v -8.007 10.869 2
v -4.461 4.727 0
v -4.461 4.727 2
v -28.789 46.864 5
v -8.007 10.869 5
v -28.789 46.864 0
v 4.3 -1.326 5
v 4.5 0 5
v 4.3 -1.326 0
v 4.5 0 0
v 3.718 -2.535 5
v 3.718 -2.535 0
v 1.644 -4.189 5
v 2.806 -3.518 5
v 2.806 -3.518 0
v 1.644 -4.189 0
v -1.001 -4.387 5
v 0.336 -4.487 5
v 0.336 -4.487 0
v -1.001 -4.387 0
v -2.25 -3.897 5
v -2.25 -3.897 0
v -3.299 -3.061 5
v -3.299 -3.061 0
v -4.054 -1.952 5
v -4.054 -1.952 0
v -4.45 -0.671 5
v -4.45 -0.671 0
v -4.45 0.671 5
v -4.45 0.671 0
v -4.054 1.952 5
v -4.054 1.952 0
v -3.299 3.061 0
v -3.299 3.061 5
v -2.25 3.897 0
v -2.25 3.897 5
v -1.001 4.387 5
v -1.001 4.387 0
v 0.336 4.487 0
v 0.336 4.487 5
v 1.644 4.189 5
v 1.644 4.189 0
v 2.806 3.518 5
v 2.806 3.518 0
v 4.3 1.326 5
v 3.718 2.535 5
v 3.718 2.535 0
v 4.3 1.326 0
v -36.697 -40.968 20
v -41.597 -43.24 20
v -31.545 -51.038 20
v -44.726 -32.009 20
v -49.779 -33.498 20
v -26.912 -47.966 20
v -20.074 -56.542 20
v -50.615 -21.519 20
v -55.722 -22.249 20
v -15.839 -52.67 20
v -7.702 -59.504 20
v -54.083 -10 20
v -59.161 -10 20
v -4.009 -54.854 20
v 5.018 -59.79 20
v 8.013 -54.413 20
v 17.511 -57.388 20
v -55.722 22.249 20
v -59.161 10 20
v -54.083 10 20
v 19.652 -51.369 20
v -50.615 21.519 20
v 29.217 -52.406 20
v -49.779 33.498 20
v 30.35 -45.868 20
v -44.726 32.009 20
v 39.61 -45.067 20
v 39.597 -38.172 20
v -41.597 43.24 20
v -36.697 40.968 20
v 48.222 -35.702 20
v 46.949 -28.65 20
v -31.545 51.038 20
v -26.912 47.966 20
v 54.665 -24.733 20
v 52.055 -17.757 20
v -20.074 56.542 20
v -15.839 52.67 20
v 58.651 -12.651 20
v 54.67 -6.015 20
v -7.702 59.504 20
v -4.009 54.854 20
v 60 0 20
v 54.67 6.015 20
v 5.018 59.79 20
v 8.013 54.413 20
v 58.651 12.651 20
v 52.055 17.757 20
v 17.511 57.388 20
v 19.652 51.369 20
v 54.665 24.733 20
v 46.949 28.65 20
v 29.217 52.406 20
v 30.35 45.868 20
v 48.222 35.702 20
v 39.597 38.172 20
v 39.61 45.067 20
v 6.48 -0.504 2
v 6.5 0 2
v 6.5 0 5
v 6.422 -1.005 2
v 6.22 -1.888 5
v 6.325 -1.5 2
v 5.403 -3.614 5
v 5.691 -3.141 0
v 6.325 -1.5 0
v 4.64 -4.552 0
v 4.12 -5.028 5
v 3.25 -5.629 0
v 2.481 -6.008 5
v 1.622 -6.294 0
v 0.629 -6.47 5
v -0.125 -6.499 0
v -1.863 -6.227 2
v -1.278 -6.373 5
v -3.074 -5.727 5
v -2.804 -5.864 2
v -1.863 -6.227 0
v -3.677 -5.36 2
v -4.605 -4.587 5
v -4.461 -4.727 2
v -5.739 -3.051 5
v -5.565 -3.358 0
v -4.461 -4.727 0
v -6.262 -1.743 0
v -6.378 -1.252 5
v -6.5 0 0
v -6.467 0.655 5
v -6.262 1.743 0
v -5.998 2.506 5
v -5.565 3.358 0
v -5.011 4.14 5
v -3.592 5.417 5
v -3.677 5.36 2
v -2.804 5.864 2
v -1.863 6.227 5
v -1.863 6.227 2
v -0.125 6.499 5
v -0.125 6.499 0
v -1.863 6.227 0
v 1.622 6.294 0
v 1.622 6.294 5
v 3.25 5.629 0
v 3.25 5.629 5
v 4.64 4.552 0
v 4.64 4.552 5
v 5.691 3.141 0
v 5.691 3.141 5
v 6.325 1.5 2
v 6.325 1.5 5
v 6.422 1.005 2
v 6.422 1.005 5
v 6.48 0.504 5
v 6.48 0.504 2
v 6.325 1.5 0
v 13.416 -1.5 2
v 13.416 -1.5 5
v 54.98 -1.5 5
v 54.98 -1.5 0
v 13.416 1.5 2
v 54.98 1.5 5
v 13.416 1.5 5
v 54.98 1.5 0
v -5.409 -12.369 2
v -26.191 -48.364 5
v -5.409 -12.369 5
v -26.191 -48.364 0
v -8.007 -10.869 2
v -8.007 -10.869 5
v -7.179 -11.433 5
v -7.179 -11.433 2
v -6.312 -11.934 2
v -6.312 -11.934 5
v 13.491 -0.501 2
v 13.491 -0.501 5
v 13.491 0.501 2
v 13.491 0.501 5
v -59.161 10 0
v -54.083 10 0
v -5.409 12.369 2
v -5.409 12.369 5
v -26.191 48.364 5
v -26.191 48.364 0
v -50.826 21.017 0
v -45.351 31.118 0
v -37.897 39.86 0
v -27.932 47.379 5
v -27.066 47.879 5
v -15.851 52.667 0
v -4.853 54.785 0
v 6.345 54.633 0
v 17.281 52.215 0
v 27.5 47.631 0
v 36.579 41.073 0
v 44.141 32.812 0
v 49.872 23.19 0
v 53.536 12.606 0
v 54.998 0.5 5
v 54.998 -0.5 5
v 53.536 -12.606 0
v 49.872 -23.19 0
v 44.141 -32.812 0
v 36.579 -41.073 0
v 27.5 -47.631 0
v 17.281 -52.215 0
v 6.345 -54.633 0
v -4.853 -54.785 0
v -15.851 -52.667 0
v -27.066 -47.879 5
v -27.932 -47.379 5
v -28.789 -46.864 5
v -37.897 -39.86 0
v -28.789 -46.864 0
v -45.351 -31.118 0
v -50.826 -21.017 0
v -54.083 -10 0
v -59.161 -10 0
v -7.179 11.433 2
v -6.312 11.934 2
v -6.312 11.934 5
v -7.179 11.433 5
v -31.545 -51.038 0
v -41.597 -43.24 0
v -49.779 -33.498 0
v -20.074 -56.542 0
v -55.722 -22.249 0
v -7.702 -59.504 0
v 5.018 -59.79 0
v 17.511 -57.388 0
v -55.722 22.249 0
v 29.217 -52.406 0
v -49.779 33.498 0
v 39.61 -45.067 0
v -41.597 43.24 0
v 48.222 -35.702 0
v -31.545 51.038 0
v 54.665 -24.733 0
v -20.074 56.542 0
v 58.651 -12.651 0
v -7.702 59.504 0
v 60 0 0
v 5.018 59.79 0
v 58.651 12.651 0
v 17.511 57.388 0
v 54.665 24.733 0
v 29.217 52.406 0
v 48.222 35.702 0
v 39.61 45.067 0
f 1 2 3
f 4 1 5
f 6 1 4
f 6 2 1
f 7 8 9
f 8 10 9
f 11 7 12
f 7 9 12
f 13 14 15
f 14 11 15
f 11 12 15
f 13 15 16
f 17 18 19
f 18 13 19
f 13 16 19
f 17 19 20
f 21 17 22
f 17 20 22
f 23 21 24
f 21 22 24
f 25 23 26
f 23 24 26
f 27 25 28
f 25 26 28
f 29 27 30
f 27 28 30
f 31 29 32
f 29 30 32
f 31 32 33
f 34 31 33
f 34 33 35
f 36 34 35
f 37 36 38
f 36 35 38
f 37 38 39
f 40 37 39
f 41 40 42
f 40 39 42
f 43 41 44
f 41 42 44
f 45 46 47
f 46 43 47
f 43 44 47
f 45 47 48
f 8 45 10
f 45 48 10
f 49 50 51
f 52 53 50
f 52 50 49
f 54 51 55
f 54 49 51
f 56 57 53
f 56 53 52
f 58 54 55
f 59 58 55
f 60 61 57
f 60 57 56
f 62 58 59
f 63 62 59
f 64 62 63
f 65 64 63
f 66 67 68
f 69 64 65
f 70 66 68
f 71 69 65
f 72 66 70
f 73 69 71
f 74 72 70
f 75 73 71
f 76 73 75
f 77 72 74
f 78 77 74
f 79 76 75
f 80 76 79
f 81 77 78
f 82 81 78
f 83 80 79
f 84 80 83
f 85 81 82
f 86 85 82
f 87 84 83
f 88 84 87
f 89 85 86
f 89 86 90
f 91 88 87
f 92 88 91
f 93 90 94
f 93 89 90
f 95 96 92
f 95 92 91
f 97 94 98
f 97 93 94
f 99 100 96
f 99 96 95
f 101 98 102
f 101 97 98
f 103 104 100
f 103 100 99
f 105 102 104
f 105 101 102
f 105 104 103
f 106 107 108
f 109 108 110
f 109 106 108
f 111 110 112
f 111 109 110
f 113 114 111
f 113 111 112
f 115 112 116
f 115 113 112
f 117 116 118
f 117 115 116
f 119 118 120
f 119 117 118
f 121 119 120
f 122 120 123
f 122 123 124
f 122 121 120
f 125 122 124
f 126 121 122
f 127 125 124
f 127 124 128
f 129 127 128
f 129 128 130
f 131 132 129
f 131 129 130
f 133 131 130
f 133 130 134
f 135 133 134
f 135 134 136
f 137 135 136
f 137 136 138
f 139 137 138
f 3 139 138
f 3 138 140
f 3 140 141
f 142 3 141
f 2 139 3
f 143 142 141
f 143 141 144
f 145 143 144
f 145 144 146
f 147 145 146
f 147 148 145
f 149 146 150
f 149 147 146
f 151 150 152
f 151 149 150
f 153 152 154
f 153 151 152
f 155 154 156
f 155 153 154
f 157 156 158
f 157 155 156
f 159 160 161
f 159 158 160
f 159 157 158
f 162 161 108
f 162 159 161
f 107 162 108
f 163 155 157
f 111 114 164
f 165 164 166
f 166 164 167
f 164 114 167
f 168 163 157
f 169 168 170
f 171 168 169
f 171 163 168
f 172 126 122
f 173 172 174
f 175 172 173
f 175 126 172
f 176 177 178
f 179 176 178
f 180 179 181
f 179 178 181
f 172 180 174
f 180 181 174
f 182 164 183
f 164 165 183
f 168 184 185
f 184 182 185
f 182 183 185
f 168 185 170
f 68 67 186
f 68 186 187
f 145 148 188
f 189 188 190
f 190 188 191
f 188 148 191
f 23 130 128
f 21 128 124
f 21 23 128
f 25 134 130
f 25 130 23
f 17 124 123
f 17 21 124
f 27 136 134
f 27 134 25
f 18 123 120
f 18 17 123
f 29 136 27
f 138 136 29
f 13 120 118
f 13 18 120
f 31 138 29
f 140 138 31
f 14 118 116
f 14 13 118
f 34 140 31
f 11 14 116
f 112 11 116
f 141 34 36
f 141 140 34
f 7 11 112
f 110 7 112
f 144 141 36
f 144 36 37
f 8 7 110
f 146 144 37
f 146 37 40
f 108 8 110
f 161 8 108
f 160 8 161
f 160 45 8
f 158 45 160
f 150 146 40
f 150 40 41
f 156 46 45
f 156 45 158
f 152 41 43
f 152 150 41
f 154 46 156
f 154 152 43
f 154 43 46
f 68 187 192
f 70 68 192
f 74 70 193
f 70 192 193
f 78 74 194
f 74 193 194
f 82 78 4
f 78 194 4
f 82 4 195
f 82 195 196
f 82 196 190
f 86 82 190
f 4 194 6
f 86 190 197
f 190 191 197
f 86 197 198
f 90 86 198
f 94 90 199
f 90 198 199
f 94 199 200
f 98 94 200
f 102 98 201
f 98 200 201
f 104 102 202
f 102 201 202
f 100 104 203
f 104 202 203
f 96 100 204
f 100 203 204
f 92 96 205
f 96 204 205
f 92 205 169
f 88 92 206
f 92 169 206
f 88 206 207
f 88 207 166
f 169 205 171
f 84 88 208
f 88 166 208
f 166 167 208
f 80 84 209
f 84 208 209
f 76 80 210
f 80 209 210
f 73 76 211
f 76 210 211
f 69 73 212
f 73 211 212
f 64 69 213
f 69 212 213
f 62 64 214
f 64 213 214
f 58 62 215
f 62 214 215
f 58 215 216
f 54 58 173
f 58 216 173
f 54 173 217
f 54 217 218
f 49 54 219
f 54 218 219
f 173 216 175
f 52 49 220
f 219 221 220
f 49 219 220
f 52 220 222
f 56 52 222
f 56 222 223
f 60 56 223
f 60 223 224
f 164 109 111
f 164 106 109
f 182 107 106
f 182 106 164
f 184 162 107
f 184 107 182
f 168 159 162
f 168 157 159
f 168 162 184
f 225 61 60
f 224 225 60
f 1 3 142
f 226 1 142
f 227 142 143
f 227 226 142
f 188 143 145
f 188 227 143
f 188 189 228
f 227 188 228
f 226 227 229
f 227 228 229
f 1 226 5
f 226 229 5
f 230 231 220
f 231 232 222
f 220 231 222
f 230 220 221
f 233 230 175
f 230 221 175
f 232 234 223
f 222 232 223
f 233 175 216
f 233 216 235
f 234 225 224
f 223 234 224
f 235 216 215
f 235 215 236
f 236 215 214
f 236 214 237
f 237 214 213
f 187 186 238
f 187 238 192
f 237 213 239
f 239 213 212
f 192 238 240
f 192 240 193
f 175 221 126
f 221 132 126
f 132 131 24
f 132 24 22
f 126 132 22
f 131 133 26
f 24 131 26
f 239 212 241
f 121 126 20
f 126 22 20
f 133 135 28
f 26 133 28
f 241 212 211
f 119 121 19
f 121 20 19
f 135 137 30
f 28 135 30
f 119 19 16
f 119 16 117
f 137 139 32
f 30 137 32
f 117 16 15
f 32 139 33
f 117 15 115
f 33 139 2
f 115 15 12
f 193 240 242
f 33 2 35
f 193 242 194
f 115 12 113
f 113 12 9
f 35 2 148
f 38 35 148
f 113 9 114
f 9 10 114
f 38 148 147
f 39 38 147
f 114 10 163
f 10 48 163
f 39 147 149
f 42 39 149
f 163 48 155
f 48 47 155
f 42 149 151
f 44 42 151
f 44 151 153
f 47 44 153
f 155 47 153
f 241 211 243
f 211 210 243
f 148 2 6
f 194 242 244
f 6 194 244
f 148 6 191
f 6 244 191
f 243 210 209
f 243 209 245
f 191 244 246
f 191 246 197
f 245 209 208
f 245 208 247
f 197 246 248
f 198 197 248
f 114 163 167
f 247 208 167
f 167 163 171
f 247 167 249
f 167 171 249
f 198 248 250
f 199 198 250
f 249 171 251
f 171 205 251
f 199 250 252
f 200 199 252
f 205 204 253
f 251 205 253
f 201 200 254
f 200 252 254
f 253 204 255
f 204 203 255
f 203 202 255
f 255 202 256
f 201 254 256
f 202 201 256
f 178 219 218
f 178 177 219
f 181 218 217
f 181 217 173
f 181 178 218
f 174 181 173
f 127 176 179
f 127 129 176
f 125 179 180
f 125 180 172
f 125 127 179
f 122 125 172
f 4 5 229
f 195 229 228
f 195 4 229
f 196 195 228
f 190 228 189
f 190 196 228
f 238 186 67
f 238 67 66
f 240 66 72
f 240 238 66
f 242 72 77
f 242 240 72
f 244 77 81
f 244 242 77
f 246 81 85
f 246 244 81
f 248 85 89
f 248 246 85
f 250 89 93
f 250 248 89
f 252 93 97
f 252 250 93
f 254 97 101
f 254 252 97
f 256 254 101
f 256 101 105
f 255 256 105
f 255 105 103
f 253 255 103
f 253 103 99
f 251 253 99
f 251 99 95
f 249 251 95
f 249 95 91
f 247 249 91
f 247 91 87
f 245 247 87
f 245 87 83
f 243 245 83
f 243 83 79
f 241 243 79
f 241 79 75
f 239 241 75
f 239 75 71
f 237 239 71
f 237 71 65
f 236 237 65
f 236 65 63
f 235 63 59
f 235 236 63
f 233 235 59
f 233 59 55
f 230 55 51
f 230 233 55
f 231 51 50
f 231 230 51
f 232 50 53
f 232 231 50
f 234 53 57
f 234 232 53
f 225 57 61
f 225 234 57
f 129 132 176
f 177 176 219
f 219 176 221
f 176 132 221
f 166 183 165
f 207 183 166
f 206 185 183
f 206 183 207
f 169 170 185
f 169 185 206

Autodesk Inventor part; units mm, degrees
ref_plane "YZ Plane" through (0, 0, 0) normal (1, 0, 0) x (0, 1, 0)
ref_plane "XZ Plane" through (0, 0, 0) normal (0, 1, 0) x (-1, 0, 0)
ref_plane "XY Plane" through (0, 0, 0) normal (0, 0, 1) x (1, 0, 0)
sketch "Sketch1" plane through (0, 0, 0) normal (0, 0, 1) x (1, 0, 0)
  circle A0 centre (0, 0) radius 60 construction
  line L0 (-59.1608, 10) -> (-59.1608, -10) construction
  circle A1 centre (0, 0) radius 55 construction
  line L1 (-59.1608, 10) -> (-54.0833, 10)
  line L2 (-59.1608, -10) -> (-54.0833, -10)
  arc A2 (-59.1608, -10) -> (-59.1608, 10) centre (0, 0) ccw
  arc A3 (-54.0833, -10) -> (-54.0833, 10) centre (0, 0) ccw
  circle A4 centre (0, 0) radius 4.5
  circle A5 centre (0, 0) radius 6.5
  line L3 (4.2426, 1.5) -> (59.9812, 1.5)
  line L4 (4.2426, -1.5) -> (59.9812, -1.5)
  arc A6 (4.2426, -1.5) -> (4.2426, 1.5) centre (0, 0) ccw
  arc A7 (59.9812, -1.5) -> (59.9812, 1.5) centre (0, 0) ccw
  line L5 (-3.4204, 2.9242) -> (-31.2897, 51.1953)
  line L6 (-0.8223, 4.4242) -> (-28.6916, 52.6953)
  line L7 (-0.8223, -4.4242) -> (-28.6916, -52.6953)
  line L8 (-3.4204, -2.9242) -> (-31.2897, -51.1953)
  arc A8 (-0.8223, 4.4242) -> (-3.4204, 2.9242) centre (0, 0) ccw
  arc A9 (-3.4204, -2.9242) -> (-0.8223, -4.4242) centre (0, 0) ccw
  arc A10 (-28.6916, 52.6953) -> (-31.2897, 51.1953) centre (0, 0) ccw
  arc A11 (-31.2897, -51.1953) -> (-28.6916, -52.6953) centre (0, 0) ccw
  point P0 (-59.1608, 0)
  dimension "d0" = 120
  dimension "d1" = 20
  dimension "d2" = 5
  dimension "d5" = 9
  dimension "d7" = 3
  dimension "d10" = 360
  dimension "d17" = 13
extrude "Extrusion1" add sketch "Sketch1" along normal blind 20 contours A2 L5 A3 L1 | A2 L6 A3 L5 | A2 L3 A3 L6 | L5 A4 L8 A5 | A5 L6 A4 L5 | A2 L4 A3 L3 | A5 L3 A4 L6 | L8 A4 L7 A5 | A2 L7 A3 L4 | A5 L4 A4 L3 | L7 A4 L4 A5 | L8 A2 L2 A3 | A3 L7 A2 L8
extrude "Extrusion2" add sketch "Sketch1" along normal blind 5 contours A2 L6 A3 L5 | A3 L6 A5 L5 | A5 L6 A4 L5 | A2 L4 A3 L3 | A3 L4 A5 L3 | L8 A4 L7 A5 | A5 L7 A3 L8 | A5 L4 A4 L3 | A3 L7 A2 L8
sketch "Sketch3" plane through (0, 0, 20) normal (0, 0, 1) x (1, 0, 0)
  circle A0 centre (0, 0) radius 4.5 projected
  circle A1 centre (0, 0) radius 6.5 projected
  point P0 (0, 0)
extrude "Extrusion3" cut sketch "Sketch3" against normal blind 15
sketch "Sketch4" plane through (0, 0, 5) normal (0, 0, 1) x (1, 0, 0)
  arc A0 (6.3246, 1.5) -> (-1.8632, 6.2272) centre (0, 0) ccw projected
  line L0 (54.9795, 1.5) -> (6.3246, 1.5) projected
  circle A1 centre (0, 0) radius 6.5
  circle A2 centre (0, 0) radius 13.5
  point P0 (0, 0)
  dimension "d18" = 27
extrude "Extrusion4" cut sketch "Sketch4" against normal blind 3
properties part number "AA051" material "ABS Plastic"
